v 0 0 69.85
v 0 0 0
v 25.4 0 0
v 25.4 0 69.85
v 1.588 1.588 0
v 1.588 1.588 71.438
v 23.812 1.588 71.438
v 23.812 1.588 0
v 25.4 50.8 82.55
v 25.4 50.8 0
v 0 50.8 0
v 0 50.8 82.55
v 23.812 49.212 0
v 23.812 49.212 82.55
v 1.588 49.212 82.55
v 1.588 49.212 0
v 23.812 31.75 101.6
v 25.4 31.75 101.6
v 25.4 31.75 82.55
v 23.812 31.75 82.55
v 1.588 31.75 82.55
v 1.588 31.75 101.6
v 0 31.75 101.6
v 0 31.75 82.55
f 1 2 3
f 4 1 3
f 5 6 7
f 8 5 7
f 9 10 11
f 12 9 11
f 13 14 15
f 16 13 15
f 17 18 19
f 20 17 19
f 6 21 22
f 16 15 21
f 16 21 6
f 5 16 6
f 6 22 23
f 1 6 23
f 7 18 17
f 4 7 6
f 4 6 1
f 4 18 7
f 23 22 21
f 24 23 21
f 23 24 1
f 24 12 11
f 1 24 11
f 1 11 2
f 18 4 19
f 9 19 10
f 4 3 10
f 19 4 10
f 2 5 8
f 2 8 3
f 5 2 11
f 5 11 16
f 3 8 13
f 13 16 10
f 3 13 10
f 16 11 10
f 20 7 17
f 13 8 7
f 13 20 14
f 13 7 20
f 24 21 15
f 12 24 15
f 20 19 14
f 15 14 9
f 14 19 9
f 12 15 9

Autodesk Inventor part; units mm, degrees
ref_plane "YZ Plane" through (0, 0, 0) normal (1, 0, 0) x (0, 1, 0)
ref_plane "XZ Plane" through (0, 0, 0) normal (0, 1, 0) x (-1, 0, 0)
ref_plane "XY Plane" through (0, 0, 0) normal (0, 0, 1) x (1, 0, 0)
sketch "Sketch1" plane through (0, 0, 0) normal (0, 0, 1) x (1, 0, 0)
  line L0 (0, 0) -> (25.4, 0)
  line L1 (25.4, 0) -> (25.4, 50.8)
  line L2 (25.4, 50.8) -> (0, 50.8)
  line L3 (0, 50.8) -> (0, 0)
  line L4 (1.5875, 1.5875) -> (23.8125, 1.5875)
  line L5 (23.8125, 1.5875) -> (23.8125, 49.2125)
  line L6 (23.8125, 49.2125) -> (1.5875, 49.2125)
  line L7 (1.5875, 49.2125) -> (1.5875, 1.5875)
  dimension "d0" = 25.4
  dimension "d1" = 50.8
  dimension "d2" = 1.5875
  dimension "d3" = 1.5875
  dimension "d4" = 1.5875
  dimension "d5" = 1.5875
extrude "Box Beam Profile" add sketch "Sketch1" along normal blind 101.6
sketch "Sketch2" plane through (25.4, 0, 0) normal (1, 0, 0) x (0, 0, -1)
  line L0 (0, 50.8) -> (-101.6, 50.8) projected
  line L1 (-101.6, 0) -> (-101.6, 50.8) projected
  line L2 (0, 0) -> (-101.6, 0) projected
  line L3 (-101.6, 31.75) -> (-69.85, 0)
  line L4 (-101.6, 31.75) -> (-82.55, 31.75)
  line L5 (-82.55, 31.75) -> (-82.55, 50.8)
  dimension "d8" = 45
  dimension "d9" = 19.05
  dimension "d10" = 19.05
extrude "Through Cutouts" cut sketch "Sketch2" against normal through all
equation "\"d3\" = d2"
equation "\"d4\" = d2"
equation "\"d5\" = d2"
equation "\"d10\" = d9"
properties part number "Bumper Rail Stand" material "Aluminum 6061"
